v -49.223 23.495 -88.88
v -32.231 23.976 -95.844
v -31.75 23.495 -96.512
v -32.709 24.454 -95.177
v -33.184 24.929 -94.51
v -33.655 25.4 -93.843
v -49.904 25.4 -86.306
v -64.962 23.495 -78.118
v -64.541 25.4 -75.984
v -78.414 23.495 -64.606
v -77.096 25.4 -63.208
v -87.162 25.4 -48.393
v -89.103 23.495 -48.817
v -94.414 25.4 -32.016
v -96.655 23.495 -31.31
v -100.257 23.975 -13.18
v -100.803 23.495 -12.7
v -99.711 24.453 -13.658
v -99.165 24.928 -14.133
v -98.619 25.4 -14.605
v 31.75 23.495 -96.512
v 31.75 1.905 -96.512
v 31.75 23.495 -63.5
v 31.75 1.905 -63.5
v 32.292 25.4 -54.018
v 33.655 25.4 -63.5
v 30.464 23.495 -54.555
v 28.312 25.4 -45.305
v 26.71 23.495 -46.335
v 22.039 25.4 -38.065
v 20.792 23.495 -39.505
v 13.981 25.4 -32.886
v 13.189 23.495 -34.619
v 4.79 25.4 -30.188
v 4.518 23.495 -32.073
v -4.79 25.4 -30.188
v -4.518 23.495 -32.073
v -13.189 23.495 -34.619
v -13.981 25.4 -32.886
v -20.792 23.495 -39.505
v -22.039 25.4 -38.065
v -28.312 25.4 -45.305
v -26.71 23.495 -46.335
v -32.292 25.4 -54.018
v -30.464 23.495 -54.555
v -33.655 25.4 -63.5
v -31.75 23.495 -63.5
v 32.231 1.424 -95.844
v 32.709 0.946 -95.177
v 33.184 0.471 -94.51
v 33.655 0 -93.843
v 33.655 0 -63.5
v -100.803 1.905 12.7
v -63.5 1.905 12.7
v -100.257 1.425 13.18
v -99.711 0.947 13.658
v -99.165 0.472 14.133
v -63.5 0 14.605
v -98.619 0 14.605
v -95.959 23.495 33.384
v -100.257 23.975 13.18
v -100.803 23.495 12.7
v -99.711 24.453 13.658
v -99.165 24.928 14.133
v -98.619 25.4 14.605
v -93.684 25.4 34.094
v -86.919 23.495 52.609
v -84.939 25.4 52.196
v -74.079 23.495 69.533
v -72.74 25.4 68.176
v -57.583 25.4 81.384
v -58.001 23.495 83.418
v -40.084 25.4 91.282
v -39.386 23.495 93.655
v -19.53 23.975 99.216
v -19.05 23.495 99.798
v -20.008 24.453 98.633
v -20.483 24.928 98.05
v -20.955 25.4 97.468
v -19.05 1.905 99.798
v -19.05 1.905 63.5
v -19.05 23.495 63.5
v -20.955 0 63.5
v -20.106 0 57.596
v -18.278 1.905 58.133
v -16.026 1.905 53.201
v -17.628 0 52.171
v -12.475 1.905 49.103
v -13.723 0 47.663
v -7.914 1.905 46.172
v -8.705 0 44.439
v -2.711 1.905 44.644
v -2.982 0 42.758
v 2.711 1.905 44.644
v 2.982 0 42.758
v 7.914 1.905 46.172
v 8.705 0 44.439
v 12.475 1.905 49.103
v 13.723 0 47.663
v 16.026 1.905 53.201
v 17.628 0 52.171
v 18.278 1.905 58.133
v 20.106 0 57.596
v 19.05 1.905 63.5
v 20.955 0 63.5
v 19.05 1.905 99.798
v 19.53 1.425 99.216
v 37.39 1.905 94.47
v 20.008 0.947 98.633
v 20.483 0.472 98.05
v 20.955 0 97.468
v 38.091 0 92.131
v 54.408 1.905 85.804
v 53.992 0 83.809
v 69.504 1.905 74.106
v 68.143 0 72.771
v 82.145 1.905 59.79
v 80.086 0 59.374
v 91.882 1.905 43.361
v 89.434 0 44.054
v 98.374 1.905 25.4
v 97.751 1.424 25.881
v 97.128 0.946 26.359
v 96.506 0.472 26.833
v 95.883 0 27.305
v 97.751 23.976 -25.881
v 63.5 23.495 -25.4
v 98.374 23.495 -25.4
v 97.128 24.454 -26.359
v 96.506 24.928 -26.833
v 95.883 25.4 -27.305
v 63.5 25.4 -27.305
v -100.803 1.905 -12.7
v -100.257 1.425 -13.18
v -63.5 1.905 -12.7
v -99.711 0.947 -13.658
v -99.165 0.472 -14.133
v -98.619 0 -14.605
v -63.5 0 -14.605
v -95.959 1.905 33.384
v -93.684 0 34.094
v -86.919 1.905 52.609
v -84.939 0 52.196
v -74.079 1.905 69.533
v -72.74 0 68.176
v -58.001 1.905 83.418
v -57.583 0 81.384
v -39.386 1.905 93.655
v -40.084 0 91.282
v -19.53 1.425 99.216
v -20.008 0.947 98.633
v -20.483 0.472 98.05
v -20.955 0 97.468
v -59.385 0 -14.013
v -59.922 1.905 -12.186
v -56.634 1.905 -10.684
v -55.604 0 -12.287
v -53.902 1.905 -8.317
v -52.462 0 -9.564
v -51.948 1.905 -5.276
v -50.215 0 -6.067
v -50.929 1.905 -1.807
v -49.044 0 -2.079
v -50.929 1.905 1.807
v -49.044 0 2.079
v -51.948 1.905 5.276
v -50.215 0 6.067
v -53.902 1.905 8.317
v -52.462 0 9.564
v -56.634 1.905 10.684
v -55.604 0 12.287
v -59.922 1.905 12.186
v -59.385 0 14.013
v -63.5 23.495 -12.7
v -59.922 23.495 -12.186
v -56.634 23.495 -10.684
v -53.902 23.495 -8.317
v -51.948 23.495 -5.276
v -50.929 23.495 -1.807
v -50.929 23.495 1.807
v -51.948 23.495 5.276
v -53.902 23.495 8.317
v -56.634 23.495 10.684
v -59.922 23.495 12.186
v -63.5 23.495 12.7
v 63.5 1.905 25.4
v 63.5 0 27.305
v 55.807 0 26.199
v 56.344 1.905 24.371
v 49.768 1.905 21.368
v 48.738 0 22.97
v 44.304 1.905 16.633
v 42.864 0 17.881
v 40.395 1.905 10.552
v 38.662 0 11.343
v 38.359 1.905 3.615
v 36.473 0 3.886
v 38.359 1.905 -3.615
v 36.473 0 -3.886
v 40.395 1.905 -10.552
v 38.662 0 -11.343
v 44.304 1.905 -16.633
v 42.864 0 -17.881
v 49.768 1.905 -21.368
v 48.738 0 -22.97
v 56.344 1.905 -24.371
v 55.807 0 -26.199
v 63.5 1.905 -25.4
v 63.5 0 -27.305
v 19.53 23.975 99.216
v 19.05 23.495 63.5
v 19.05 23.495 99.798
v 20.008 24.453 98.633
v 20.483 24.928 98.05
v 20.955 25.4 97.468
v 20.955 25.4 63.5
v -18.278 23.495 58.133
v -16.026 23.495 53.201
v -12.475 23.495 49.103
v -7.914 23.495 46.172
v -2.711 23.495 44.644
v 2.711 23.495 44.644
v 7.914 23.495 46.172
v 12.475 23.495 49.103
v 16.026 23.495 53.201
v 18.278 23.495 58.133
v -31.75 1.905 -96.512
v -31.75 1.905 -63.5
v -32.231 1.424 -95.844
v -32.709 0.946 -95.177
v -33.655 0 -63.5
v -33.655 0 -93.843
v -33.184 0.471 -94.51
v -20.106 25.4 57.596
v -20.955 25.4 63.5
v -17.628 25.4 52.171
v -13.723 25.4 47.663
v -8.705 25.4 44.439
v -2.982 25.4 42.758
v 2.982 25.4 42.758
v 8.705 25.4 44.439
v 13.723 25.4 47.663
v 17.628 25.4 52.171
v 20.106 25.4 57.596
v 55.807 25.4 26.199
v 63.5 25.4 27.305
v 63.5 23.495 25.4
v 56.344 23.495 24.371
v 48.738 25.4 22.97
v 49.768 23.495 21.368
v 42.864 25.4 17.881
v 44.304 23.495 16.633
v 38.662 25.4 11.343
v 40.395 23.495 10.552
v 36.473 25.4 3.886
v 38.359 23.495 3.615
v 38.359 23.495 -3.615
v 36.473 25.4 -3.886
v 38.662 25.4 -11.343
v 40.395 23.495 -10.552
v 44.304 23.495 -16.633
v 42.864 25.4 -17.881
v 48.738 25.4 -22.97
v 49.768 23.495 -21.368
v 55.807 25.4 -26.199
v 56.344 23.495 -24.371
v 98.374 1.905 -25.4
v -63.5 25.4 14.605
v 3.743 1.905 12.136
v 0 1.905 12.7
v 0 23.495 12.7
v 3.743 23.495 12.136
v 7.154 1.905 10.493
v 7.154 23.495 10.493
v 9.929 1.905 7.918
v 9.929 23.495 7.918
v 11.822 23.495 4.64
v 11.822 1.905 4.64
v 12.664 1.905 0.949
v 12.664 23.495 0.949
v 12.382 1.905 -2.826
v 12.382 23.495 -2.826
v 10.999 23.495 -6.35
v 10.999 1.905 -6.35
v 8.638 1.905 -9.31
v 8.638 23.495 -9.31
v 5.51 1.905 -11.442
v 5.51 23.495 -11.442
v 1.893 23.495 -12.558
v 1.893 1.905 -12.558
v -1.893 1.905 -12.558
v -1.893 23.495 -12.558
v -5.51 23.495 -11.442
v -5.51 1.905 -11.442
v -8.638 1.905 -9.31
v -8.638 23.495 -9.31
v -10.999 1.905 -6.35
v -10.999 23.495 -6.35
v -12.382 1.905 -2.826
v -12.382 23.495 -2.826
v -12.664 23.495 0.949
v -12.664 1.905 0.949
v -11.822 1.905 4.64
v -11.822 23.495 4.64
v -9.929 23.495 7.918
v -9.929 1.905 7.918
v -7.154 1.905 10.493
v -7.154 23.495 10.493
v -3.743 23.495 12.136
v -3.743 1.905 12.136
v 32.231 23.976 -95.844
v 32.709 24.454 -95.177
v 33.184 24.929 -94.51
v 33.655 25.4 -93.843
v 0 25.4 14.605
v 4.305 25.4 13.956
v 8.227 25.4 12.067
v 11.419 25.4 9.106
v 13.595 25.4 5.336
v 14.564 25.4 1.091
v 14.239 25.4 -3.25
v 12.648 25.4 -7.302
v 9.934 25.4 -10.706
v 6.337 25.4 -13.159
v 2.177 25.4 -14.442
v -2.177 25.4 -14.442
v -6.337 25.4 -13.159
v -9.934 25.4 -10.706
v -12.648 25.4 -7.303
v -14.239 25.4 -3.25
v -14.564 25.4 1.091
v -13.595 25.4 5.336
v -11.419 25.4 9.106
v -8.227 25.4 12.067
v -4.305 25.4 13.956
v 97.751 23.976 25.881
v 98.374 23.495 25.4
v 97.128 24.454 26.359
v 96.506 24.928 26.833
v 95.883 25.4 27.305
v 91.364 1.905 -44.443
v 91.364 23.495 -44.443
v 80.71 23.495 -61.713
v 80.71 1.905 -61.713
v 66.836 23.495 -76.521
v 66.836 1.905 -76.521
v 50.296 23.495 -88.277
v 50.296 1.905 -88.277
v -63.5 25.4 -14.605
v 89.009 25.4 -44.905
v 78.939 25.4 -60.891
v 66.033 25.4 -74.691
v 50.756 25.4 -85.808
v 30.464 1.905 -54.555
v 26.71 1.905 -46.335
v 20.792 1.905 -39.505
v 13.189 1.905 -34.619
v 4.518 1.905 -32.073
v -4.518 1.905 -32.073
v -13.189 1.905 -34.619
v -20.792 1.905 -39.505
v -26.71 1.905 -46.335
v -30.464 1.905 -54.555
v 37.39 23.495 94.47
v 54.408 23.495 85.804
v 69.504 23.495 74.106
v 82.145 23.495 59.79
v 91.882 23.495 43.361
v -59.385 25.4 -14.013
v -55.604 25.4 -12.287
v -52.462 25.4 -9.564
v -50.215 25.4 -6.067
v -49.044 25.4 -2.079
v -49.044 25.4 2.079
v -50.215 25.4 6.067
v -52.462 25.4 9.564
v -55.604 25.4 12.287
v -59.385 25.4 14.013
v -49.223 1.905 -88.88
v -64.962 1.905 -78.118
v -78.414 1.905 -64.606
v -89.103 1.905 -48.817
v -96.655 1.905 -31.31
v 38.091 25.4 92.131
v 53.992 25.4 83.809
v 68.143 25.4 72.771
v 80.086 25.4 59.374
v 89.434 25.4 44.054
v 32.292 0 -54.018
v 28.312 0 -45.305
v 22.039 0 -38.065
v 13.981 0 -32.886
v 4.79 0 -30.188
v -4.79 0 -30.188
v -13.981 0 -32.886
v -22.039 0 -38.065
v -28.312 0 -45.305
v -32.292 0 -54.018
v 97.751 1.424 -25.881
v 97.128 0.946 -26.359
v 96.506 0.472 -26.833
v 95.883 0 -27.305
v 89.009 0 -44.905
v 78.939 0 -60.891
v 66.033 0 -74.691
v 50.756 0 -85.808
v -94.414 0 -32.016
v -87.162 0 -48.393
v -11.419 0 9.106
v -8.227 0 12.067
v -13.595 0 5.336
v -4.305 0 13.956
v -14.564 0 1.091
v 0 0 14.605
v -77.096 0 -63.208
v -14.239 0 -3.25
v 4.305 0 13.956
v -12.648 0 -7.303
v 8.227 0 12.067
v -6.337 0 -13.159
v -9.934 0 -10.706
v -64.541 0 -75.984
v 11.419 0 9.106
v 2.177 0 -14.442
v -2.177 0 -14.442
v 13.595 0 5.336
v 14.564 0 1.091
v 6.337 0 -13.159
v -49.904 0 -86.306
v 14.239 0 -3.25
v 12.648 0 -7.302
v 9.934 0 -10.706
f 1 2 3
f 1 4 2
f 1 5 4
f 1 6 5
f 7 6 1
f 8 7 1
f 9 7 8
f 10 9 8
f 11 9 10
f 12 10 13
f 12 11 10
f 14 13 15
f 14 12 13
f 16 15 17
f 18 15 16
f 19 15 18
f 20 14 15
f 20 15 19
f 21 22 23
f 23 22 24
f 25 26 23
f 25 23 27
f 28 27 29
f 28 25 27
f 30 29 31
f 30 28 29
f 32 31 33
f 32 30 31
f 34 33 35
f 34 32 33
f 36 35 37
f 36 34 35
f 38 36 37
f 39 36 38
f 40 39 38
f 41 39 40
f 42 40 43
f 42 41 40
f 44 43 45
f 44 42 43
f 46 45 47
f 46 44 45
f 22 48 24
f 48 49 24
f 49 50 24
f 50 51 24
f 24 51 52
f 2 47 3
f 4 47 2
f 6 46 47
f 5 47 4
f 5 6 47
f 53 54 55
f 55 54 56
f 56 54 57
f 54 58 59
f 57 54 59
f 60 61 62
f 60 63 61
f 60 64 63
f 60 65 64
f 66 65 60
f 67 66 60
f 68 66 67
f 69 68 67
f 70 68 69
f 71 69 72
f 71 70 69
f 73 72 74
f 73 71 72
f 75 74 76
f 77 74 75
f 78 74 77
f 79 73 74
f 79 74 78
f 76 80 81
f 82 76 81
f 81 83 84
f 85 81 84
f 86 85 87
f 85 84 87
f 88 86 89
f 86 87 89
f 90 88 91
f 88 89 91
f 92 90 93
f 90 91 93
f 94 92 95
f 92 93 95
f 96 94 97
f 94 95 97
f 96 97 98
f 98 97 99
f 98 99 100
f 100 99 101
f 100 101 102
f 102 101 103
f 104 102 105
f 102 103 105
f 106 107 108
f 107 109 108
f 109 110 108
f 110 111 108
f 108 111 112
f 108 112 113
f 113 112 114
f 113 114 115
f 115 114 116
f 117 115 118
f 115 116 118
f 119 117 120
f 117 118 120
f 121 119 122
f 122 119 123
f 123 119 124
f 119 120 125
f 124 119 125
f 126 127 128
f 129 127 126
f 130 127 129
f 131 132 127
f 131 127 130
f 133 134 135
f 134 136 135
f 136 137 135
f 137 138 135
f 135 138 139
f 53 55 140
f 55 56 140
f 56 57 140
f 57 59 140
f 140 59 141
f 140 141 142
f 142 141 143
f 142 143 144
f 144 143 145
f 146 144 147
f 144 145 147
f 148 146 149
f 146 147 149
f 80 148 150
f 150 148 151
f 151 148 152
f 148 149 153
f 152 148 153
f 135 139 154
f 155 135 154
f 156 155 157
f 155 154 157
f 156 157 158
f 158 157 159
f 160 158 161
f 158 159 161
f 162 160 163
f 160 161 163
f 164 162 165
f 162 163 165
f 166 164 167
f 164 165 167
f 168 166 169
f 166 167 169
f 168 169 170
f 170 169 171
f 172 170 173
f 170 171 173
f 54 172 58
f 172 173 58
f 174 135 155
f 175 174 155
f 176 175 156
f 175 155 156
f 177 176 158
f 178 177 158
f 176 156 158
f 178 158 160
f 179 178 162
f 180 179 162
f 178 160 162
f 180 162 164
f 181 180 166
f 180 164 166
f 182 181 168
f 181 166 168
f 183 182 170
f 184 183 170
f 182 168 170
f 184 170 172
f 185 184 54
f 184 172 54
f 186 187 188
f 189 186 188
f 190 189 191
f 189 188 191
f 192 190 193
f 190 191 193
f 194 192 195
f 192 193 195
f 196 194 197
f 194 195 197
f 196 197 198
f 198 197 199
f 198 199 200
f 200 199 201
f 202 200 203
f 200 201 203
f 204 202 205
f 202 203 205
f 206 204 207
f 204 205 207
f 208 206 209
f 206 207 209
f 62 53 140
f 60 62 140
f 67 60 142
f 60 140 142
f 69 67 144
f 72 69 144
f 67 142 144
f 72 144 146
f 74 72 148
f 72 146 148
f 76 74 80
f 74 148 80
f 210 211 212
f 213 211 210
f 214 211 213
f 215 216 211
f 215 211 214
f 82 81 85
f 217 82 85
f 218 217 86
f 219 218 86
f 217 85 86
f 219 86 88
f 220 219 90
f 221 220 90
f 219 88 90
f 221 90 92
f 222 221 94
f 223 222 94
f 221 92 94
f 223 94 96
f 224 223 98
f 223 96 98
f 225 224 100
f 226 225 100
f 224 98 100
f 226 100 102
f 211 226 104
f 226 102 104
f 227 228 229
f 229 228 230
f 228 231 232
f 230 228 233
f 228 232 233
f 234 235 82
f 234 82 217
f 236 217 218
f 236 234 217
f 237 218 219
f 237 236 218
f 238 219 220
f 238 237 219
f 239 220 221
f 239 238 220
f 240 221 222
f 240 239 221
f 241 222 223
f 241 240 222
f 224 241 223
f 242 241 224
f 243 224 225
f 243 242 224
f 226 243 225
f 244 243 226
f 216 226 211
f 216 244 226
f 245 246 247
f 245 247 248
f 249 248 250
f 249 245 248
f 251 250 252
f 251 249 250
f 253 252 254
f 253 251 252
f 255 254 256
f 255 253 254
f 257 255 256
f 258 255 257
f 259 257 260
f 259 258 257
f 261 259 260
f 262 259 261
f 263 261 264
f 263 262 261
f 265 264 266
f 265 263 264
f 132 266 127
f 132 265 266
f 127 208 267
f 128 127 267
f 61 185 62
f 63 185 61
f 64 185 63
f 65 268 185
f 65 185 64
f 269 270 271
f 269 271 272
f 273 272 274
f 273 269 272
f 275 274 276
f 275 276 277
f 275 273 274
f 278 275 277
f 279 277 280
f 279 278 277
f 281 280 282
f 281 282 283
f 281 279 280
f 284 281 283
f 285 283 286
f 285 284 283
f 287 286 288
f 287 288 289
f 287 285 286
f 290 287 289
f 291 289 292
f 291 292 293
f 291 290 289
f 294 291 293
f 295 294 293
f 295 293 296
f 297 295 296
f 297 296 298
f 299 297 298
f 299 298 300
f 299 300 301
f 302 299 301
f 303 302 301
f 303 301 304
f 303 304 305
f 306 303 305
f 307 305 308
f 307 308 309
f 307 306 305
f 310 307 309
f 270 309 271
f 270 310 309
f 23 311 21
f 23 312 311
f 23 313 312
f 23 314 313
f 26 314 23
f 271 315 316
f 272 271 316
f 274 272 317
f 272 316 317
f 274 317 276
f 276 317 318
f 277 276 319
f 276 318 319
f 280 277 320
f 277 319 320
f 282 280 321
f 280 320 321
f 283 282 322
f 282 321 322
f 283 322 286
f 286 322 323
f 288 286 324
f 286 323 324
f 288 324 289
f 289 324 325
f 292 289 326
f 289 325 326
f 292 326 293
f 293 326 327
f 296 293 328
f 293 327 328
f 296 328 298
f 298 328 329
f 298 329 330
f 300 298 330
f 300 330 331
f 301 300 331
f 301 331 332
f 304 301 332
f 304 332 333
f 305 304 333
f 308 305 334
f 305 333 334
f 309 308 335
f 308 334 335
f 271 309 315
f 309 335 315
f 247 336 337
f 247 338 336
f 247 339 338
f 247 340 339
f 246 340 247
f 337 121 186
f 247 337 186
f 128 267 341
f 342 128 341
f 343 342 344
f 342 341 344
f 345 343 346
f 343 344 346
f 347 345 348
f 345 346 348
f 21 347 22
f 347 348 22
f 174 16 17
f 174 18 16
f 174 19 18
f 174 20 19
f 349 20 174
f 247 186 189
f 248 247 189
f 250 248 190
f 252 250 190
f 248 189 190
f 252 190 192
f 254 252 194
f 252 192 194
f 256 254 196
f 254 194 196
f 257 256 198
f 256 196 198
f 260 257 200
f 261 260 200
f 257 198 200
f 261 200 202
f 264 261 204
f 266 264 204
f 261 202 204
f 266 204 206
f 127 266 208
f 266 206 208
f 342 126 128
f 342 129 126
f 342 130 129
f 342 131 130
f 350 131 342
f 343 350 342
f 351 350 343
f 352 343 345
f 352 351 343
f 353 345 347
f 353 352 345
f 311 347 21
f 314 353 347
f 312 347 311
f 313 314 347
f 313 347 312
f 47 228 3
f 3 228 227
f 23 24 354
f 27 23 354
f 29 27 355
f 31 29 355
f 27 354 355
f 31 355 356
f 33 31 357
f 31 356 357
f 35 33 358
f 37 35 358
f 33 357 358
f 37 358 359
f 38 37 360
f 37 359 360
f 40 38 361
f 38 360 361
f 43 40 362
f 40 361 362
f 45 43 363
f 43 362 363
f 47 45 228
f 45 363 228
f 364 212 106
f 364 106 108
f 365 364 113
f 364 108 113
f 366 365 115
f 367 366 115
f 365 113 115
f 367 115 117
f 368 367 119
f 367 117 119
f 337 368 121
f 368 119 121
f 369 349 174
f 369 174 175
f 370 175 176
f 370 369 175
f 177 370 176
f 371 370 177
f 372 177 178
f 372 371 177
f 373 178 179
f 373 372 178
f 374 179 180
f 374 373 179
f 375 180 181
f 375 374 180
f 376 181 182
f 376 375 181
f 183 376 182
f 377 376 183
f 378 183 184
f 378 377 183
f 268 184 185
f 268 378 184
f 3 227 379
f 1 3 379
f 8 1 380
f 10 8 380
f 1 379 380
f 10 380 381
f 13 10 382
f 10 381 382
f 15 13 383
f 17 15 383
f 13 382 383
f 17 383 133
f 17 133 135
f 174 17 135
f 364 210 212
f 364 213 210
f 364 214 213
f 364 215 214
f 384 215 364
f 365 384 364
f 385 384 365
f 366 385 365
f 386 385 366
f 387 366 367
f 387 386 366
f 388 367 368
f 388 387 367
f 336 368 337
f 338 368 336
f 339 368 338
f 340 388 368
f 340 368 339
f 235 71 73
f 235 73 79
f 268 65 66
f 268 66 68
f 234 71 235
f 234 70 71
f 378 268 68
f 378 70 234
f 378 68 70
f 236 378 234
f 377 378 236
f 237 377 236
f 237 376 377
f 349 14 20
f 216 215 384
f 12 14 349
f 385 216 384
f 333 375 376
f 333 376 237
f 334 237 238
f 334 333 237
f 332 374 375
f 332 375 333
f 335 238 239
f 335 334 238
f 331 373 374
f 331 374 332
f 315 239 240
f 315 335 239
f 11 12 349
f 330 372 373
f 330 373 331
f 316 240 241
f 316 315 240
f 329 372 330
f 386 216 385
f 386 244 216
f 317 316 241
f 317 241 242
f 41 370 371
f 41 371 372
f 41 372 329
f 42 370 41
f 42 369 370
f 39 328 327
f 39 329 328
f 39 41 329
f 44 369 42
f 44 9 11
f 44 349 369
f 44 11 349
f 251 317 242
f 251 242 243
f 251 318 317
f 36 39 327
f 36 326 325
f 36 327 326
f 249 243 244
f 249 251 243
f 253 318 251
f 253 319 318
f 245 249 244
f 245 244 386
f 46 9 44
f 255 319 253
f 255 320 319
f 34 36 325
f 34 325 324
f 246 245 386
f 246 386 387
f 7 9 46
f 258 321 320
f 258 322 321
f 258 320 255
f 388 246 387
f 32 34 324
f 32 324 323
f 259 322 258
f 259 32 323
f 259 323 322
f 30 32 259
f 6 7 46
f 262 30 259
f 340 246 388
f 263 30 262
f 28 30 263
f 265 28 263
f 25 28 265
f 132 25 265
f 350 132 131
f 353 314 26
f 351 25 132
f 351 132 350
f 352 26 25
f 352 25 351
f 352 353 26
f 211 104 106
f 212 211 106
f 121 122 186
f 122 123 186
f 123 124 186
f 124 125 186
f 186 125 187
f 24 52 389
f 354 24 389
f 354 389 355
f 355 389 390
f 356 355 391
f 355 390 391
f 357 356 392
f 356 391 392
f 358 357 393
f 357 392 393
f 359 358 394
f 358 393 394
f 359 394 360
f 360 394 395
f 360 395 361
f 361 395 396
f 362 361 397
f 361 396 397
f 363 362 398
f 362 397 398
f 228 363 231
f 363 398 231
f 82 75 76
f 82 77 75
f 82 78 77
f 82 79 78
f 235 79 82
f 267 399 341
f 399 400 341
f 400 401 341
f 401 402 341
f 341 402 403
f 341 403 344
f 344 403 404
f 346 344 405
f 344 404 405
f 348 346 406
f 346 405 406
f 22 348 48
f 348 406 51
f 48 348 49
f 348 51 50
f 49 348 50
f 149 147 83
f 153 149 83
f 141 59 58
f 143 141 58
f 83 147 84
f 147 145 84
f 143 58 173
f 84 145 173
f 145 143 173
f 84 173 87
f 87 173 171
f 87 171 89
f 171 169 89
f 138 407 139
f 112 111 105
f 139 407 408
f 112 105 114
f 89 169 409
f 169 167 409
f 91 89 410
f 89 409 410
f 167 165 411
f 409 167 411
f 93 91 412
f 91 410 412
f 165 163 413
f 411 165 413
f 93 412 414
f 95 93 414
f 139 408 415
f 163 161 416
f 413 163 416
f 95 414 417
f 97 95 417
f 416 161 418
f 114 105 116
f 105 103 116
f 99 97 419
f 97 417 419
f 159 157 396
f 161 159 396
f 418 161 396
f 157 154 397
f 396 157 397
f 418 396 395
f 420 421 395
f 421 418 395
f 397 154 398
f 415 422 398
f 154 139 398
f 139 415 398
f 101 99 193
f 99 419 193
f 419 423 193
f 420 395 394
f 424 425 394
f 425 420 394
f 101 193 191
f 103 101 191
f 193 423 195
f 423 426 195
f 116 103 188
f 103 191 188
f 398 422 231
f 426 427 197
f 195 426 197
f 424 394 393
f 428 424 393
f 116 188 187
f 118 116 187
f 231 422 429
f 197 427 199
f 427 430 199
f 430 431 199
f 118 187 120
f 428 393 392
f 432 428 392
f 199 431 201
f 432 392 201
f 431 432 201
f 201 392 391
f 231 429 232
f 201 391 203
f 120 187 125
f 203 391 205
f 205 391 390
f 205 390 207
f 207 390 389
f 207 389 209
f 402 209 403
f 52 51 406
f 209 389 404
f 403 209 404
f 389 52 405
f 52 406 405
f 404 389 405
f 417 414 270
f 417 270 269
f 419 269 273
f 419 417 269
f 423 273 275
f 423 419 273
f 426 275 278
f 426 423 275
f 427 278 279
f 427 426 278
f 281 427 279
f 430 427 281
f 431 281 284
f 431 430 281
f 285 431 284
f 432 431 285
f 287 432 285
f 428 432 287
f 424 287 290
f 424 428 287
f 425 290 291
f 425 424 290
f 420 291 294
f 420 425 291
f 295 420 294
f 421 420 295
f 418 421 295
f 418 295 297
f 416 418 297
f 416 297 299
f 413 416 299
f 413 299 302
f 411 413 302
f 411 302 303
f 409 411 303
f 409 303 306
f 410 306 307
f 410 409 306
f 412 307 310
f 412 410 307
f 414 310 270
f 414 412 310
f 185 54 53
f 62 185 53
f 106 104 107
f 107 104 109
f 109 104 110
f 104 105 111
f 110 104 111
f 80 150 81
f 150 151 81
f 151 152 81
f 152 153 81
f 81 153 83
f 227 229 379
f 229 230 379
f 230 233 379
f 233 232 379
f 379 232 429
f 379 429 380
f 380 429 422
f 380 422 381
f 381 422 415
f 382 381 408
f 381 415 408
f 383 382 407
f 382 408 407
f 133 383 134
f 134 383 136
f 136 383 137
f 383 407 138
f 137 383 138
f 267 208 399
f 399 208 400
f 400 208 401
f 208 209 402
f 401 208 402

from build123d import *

# Parameters (mm, degrees)
SKETCH2_R           = 12.7
BOSS_EXTRUDE1_DEPTH = 25.4
CHAMFER1_SIZE       = 1.905


with BuildPart() as part:
    # Sketch2 → Boss-Extrude1 (new body)
    with BuildSketch(Plane(origin=(0, 0, 0), x_dir=(1, 0, 0), z_dir=(0, 1, 0))):
        with BuildLine():
            Line((63.5, 25.4), (98.373776994, 25.4))
            ThreePointArc((98.373776994, 25.4), (74.143548783, 69.464337424), (31.75, 96.511644375))
            Line((31.75, 96.511644375), (31.75, 63.5))
            ThreePointArc((31.75, 63.5), (0, 31.75), (-31.75, 63.5))
            Line((-31.75, 63.5), (-31.75, 96.511644375))
            ThreePointArc((-31.75, 96.511644375), (-78.413523495, 64.605567354), (-100.803124952, 12.7))
            Line((-100.803124952, 12.7), (-63.5, 12.7))
            ThreePointArc((-63.5, 12.7), (-50.8, 0), (-63.5, -12.7))
            Line((-63.5, -12.7), (-100.803124952, -12.7))
            ThreePointArc((-100.803124952, -12.7), (-74.079092421, -69.533071743), (-19.05, -99.798083649))
            Line((-19.05, -99.798083649), (-19.05, -63.5))
            ThreePointArc((-19.05, -63.5), (0, -44.45), (19.05, -63.5))
            Line((19.05, -63.5), (19.05, -99.798083649))
            ThreePointArc((19.05, -99.798083649), (69.504349242, -74.106041835), (98.373776994, -25.4))
            Line((98.373776994, -25.4), (63.5, -25.4))
            ThreePointArc((63.5, -25.4), (38.1, 0), (63.5, 25.4))
        make_face()
        with Locations(Location((0, 0, 0), (0, 0, 270))):
            Circle(SKETCH2_R, mode=Mode.SUBTRACT)
    extrude(amount=BOSS_EXTRUDE1_DEPTH)

    # Chamfer1
    chamfer1_edges = [part.edges().sort_by_distance(p)[0] for p in [
        (74.143548783, 25.4, -69.464337424),
        (80.936888497, 0, 25.4),
        (69.504349242, 0, 74.106041835),
        (19.05, 0, 81.649041824),
        (31.75, 25.4, -80.005822188),
        (0, 0, 44.45),
        (-19.05, 0, 81.649041824),
        (-74.079092421, 0, 69.533071743),
        (-82.151562476, 0, 12.7),
        (-50.8, 0, 0),
        (-82.151562476, 0, -12.7),
        (-78.413523495, 0, -64.605567354),
        (-31.75, 0, -80.005822188),
        (0, 0, -31.75),
        (31.75, 0, -80.005822188),
        (0, 25.4, -31.75),
        (74.143548783, 0, -69.464337424),
        (80.936888497, 0, -25.4),
        (38.1, 0, 0),
        (-31.75, 25.4, -80.005822188),
        (-78.413523495, 25.4, -64.605567354),
        (-82.151562476, 25.4, -12.7),
        (-50.8, 25.4, 0),
        (0, 0, -12.7),
        (0, 25.4, -12.7),
        (-82.151562476, 25.4, 12.7),
        (-74.079092421, 25.4, 69.533071743),
        (-19.05, 25.4, 81.649041824),
        (38.1, 25.4, 0),
        (0, 25.4, 44.45),
        (19.05, 25.4, 81.649041824),
        (69.504349242, 25.4, 74.106041835),
        (80.936888497, 25.4, 25.4),
        (80.936888497, 25.4, -25.4),
    ]]
    chamfer(chamfer1_edges, length=CHAMFER1_SIZE)


solid = part.part
